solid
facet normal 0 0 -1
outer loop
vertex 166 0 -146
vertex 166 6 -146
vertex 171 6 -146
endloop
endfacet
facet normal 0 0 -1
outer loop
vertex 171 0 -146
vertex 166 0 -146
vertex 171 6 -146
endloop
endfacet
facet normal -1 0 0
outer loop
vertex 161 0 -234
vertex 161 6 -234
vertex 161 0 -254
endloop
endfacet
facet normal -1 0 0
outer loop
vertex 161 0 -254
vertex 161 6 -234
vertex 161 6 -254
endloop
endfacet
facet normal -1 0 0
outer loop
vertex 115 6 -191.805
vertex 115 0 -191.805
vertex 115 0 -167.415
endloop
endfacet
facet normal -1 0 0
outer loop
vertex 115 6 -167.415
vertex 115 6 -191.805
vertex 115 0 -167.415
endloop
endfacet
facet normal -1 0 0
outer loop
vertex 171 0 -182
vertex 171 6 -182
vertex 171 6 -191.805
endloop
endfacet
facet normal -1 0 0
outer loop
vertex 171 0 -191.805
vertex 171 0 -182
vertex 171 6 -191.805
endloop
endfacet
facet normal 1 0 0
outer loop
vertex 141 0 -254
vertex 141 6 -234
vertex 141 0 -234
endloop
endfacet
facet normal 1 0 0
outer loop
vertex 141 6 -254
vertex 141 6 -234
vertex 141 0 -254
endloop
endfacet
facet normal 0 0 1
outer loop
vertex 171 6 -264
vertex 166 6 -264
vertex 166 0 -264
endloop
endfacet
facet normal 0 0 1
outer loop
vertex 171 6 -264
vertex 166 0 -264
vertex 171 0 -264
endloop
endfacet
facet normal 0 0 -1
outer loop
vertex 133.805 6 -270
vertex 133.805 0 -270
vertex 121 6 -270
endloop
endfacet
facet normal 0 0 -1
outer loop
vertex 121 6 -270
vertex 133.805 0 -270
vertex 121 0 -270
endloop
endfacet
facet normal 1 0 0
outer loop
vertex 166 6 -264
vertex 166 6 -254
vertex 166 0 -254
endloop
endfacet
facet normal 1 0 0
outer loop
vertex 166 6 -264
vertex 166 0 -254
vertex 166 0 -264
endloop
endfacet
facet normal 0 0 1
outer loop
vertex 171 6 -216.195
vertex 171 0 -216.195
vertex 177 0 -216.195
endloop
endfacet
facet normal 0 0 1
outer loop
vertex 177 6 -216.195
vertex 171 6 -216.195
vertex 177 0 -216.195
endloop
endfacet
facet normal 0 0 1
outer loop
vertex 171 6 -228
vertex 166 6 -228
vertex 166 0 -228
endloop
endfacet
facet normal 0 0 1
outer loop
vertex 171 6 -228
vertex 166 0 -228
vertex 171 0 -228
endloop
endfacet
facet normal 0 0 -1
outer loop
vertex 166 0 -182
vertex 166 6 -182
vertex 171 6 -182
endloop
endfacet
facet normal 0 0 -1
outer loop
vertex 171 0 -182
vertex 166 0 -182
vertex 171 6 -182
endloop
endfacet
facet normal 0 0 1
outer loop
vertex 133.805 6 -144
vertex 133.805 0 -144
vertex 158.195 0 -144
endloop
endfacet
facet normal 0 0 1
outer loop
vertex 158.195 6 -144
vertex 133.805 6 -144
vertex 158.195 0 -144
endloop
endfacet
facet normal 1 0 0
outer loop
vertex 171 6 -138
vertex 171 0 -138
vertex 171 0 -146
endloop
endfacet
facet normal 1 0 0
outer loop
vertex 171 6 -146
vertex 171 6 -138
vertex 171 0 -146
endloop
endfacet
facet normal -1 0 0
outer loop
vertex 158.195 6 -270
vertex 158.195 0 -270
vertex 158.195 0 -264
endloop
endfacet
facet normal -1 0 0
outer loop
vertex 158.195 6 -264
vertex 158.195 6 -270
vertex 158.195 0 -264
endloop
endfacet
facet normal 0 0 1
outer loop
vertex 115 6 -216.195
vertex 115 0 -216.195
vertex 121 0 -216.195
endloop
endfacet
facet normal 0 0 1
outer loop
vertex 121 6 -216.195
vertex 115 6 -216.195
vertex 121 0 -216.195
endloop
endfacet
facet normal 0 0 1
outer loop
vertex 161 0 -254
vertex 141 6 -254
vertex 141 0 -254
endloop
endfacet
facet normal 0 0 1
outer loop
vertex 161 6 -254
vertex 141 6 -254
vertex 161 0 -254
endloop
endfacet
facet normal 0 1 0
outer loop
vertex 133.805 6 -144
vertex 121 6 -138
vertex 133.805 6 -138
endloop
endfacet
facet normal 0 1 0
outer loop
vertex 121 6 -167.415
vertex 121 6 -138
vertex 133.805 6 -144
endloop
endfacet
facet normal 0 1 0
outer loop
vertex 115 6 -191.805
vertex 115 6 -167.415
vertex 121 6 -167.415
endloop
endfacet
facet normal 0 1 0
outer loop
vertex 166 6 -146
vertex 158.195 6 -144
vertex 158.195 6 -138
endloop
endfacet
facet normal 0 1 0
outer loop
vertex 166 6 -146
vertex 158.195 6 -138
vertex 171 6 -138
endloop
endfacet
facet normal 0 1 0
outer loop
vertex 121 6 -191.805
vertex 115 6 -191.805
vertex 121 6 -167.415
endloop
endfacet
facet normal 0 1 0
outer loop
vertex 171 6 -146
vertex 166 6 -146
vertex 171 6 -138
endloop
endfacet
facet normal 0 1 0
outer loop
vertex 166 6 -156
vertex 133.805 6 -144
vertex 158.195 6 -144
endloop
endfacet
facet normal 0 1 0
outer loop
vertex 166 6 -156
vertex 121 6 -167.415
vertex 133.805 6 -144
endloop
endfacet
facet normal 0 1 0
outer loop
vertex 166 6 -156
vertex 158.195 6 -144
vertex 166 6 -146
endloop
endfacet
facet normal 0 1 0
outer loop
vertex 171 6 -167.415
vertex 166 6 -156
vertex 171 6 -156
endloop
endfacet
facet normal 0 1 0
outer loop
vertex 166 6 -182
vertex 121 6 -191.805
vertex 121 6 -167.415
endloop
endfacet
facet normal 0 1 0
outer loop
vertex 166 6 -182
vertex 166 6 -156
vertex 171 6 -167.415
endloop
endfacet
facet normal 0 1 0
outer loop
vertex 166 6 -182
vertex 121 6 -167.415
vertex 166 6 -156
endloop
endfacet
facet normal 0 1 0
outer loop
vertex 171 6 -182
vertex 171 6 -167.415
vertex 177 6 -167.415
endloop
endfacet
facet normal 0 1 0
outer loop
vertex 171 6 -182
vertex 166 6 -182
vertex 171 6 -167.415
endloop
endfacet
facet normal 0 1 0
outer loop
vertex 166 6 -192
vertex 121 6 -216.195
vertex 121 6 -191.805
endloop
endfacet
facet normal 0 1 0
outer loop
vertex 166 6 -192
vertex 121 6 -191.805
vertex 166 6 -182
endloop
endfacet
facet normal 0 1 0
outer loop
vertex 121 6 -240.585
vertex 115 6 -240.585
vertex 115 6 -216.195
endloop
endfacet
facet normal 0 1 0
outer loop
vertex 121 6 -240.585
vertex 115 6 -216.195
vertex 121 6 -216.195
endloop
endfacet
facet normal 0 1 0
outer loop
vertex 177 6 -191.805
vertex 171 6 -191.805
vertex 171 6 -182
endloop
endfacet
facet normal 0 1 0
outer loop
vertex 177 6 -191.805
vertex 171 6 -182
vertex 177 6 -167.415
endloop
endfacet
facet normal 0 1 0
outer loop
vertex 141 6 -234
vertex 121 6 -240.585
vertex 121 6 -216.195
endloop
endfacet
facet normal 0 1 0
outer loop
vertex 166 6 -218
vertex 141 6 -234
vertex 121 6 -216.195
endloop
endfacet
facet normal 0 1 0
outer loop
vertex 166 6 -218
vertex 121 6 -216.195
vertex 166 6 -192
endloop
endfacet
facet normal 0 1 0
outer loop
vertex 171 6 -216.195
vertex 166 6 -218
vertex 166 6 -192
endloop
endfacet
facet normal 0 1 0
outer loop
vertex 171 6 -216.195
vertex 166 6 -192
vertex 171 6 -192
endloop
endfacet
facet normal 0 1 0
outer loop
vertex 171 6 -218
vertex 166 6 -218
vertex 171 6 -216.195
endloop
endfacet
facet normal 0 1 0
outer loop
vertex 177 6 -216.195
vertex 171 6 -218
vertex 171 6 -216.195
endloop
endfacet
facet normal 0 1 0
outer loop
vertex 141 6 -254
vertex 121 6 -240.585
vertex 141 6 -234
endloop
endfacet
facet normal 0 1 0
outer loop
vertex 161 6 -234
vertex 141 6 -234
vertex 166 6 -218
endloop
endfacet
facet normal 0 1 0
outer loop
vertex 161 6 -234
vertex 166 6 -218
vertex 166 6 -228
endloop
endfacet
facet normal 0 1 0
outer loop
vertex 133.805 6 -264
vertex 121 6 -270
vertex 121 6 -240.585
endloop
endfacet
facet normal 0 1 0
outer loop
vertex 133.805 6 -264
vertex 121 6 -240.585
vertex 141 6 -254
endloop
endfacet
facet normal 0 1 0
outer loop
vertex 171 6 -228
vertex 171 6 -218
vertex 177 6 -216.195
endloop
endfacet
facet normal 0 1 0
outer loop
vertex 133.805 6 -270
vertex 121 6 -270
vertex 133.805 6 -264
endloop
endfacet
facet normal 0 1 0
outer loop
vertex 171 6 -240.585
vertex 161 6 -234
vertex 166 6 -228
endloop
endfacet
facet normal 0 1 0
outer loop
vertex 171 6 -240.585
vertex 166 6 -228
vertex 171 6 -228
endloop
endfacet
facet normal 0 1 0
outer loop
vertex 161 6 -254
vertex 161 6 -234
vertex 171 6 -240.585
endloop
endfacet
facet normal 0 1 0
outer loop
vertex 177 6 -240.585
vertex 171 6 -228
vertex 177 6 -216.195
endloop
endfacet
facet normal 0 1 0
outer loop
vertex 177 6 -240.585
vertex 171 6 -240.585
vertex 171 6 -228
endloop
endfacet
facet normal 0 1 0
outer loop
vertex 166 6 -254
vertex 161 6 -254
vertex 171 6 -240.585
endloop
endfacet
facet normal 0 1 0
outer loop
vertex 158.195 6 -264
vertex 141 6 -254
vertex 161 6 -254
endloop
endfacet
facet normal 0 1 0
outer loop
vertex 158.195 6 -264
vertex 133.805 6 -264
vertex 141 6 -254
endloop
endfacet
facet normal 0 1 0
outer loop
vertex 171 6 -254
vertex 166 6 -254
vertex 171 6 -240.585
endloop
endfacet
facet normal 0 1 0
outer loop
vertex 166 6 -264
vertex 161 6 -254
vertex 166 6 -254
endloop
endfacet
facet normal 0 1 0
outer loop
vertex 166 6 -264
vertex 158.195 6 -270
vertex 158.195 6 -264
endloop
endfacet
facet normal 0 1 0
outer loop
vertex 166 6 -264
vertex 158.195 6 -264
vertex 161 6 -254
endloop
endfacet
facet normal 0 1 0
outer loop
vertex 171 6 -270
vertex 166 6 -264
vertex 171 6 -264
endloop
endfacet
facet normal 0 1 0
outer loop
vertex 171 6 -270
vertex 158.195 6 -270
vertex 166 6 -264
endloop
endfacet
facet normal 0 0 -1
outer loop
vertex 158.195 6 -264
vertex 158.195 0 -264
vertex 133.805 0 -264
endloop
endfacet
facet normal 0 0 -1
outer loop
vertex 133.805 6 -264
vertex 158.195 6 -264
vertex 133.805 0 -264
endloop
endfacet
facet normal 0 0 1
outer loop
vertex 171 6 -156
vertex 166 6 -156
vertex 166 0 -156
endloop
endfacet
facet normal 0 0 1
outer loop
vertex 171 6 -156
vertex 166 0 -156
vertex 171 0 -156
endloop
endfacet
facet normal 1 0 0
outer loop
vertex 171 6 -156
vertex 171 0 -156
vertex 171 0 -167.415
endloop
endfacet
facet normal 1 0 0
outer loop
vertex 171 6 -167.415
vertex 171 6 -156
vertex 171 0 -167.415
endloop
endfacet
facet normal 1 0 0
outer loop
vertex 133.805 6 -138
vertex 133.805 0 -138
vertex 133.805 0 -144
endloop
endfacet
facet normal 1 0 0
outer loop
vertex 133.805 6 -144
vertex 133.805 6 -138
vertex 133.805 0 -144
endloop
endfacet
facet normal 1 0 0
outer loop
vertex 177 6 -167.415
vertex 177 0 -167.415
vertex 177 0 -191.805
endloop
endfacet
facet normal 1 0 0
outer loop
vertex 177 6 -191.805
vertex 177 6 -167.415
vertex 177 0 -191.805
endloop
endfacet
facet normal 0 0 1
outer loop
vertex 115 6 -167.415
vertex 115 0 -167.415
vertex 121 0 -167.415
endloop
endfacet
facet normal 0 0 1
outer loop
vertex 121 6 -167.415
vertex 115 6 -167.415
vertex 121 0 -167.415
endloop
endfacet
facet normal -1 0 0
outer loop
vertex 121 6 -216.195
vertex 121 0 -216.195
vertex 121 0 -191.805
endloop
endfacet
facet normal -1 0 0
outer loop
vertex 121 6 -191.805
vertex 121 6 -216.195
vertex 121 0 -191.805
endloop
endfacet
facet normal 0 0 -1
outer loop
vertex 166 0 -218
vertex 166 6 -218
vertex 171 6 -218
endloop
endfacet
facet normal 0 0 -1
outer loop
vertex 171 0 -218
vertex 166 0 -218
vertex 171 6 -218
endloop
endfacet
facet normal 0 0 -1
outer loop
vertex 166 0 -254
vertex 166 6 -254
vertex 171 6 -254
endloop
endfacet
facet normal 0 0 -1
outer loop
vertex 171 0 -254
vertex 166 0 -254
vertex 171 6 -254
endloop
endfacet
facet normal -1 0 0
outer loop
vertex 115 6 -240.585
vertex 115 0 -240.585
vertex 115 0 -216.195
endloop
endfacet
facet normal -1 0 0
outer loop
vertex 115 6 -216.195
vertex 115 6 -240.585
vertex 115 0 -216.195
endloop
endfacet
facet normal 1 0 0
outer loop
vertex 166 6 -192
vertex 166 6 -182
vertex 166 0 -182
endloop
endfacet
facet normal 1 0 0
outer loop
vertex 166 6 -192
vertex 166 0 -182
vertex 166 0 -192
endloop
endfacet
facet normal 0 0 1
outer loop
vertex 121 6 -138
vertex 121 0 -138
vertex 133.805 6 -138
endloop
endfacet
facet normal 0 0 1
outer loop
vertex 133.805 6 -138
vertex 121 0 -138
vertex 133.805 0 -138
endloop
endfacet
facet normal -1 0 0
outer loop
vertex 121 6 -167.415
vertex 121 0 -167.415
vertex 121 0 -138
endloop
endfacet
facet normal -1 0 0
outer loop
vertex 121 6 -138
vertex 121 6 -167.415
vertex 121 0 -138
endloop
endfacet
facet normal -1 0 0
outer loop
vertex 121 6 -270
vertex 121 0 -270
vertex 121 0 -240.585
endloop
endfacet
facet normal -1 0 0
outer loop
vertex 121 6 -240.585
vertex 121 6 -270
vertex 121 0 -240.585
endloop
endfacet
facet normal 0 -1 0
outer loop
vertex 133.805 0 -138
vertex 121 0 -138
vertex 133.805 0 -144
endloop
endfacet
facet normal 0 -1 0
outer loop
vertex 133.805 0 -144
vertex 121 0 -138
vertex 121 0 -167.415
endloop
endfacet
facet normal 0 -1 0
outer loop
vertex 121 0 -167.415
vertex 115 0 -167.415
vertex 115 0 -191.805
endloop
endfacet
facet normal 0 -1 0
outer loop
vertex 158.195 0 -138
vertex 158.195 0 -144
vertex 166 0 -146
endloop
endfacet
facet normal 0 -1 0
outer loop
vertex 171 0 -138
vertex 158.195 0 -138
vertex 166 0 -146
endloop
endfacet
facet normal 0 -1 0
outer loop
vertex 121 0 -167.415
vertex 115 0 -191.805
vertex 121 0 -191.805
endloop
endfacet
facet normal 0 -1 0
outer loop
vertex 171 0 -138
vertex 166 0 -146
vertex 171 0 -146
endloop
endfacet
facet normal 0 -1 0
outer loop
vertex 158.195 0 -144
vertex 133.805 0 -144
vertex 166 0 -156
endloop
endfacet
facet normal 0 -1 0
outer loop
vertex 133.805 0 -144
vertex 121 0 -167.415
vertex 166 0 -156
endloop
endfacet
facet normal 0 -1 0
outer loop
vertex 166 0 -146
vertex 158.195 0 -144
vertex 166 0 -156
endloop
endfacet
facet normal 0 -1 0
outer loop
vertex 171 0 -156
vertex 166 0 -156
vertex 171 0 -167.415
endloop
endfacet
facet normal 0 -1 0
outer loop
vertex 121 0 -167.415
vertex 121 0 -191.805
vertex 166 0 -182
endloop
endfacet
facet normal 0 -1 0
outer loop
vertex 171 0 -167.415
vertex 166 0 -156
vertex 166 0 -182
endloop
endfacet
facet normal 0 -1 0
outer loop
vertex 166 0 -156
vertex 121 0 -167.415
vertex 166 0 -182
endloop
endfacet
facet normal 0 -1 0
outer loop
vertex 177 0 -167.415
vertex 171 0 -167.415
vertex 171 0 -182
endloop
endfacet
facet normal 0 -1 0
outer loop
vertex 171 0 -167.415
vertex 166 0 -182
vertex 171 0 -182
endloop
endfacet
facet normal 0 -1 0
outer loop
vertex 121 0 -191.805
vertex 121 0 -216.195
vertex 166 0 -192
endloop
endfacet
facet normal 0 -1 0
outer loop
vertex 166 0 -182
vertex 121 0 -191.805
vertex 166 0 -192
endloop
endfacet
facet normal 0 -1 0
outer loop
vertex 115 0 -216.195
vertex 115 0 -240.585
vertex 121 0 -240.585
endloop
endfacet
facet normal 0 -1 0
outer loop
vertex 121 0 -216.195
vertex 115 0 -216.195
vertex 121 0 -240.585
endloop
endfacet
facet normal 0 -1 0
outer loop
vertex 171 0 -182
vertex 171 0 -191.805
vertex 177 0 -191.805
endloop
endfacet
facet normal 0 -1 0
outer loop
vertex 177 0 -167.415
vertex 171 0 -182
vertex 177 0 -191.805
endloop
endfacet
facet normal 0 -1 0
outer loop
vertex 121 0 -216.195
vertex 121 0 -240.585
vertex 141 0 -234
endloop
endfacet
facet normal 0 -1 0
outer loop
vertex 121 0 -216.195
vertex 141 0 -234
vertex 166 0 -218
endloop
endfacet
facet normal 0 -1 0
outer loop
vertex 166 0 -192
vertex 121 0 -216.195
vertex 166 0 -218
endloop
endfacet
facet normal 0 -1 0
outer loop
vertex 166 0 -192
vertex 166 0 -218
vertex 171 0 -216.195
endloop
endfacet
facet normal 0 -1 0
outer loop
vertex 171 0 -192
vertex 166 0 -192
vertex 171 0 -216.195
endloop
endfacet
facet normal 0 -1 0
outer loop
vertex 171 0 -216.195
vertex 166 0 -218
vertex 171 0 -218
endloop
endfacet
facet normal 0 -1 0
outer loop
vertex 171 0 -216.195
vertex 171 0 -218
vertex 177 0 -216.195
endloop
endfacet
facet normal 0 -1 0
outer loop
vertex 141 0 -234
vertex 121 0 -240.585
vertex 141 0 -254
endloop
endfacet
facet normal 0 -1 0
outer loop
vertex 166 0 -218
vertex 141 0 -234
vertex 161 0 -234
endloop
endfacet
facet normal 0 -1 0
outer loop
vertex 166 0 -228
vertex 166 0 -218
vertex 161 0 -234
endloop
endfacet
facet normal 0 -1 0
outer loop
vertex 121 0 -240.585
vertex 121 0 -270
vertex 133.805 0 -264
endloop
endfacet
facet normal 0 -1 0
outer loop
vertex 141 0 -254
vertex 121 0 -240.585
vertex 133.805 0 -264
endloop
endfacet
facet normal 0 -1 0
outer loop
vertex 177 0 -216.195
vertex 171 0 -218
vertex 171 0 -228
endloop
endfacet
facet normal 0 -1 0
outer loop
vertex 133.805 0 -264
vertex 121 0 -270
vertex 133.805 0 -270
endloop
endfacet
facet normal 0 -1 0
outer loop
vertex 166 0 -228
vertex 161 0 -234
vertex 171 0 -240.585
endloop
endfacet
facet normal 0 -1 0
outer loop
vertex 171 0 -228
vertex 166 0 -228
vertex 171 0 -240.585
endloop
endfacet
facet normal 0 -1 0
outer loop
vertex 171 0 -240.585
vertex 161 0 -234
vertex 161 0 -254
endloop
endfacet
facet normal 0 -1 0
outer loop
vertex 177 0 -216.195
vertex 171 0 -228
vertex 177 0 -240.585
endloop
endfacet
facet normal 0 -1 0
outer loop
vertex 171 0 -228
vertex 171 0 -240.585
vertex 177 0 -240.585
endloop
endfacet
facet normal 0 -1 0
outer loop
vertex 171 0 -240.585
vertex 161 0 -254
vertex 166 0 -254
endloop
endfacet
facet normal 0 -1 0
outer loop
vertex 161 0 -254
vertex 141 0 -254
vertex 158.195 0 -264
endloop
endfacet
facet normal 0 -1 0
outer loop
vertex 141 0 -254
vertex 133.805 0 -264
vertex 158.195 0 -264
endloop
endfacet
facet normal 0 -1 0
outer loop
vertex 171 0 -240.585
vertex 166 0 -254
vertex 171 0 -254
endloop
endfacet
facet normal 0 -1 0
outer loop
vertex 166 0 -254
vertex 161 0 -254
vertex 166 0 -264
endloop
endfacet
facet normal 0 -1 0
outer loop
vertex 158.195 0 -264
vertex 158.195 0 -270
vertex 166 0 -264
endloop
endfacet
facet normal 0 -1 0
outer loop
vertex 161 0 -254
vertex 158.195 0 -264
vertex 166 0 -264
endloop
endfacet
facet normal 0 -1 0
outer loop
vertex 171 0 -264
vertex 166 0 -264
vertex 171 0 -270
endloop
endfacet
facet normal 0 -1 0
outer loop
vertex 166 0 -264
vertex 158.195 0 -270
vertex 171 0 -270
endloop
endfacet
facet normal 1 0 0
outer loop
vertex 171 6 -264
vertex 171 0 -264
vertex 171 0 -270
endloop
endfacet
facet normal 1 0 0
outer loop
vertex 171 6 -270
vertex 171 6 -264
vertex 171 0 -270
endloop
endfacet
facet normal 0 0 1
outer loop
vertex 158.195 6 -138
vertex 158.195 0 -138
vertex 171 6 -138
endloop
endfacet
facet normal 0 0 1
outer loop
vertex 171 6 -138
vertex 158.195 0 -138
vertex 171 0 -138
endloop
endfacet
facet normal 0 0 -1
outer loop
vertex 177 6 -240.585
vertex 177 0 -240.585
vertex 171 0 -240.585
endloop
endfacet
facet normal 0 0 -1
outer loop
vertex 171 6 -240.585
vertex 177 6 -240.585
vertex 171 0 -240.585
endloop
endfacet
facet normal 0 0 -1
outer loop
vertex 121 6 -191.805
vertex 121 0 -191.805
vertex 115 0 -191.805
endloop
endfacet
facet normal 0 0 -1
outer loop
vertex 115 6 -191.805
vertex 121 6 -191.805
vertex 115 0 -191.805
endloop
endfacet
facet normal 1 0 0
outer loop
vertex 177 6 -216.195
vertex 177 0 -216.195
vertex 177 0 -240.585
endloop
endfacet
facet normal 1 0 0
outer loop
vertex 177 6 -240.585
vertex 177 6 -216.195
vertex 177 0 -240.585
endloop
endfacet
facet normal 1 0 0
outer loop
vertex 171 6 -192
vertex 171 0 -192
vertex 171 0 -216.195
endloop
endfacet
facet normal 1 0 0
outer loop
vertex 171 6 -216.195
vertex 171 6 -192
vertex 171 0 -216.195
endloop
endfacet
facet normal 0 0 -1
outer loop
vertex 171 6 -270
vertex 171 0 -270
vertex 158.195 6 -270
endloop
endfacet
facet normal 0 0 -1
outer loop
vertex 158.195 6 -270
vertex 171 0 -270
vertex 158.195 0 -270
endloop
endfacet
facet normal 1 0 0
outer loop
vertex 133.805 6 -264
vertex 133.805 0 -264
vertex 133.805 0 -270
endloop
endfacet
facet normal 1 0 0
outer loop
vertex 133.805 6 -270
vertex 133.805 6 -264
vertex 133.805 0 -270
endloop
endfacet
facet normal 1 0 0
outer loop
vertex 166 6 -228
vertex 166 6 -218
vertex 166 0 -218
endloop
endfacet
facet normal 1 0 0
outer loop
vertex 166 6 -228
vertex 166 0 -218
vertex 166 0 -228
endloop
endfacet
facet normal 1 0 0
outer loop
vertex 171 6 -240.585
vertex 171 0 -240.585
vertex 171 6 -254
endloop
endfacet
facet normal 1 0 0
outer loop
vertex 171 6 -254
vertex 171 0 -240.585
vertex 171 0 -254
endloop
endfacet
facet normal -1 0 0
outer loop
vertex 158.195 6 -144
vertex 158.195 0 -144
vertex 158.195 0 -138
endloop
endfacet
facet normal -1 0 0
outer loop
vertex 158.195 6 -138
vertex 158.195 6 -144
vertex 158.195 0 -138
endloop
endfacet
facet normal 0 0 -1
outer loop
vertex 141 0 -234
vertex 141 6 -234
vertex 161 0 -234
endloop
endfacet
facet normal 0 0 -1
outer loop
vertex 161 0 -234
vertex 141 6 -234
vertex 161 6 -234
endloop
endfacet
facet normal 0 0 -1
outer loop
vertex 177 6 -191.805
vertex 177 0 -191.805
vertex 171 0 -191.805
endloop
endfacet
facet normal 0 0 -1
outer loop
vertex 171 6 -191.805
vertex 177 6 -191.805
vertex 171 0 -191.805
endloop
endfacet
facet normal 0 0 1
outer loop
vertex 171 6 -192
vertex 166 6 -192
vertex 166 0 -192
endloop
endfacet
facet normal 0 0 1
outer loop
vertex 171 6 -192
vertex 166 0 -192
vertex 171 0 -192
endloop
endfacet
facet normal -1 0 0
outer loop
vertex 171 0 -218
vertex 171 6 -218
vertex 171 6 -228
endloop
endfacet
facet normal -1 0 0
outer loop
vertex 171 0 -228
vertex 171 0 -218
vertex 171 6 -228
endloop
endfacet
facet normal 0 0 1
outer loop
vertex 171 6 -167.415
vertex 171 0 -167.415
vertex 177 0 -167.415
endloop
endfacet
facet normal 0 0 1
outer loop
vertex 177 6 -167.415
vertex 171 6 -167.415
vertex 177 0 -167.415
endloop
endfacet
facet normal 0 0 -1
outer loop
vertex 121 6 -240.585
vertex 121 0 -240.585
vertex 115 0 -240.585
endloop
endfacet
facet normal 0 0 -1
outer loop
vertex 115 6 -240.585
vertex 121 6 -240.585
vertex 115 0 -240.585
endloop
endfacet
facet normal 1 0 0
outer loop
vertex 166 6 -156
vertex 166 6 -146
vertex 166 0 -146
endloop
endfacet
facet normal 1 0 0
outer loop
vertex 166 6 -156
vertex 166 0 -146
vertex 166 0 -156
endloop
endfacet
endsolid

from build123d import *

# Parameters (mm, degrees)
BOSS_EXTRUDE1_DEPTH = 6
SKETCH3_W           = 20
SKETCH3_H           = 20
SKETCH3_W_2         = 5
SKETCH3_H_2         = 10
CUT_EXTRUDE1_DEPTH  = 6


with BuildPart() as part:
    # Sketch2 → Boss-Extrude1 (new body)
    with BuildSketch(Plane(origin=(0, 0, 0), x_dir=(1, 0, 0), z_dir=(0, 1, 0))):
        Polygon((121, 270), (121, 240.585), (115, 240.585), (115, 216.195), (121, 216.195), (121, 191.805), (115, 191.805), (115, 167.415), (121, 167.415), (121, 143.025), (121, 138), (133.805, 138), (133.805, 144), (158.195, 144), (158.195, 138), (171, 138), (171, 167.415), (177, 167.415), (177, 191.805), (171, 191.805), (171, 216.195), (177, 216.195), (177, 240.585), (171, 240.585), (171, 264.975), (171, 270), (158.195, 270), (158.195, 264), (133.805, 264), (133.805, 270), align=None)
    extrude(amount=BOSS_EXTRUDE1_DEPTH)

    # Sketch3 → Cut-Extrude1 (cut)
    with BuildSketch(Plane(origin=(0, 6, 0), x_dir=(1, 0, 0), z_dir=(0, 1, 0))):
        with Locations((151, 244)):
            Rectangle(SKETCH3_W, SKETCH3_H)
        with Locations((168.5, 223)):
            Rectangle(SKETCH3_W_2, SKETCH3_H_2)
        with Locations((168.5, 259)):
            Rectangle(SKETCH3_W_2, SKETCH3_H_2)
        with Locations((168.5, 187)):
            Rectangle(SKETCH3_W_2, SKETCH3_H_2)
        with Locations((168.5, 151)):
            Rectangle(SKETCH3_W_2, SKETCH3_H_2)
    extrude(amount=-CUT_EXTRUDE1_DEPTH, mode=Mode.SUBTRACT)


solid = part.part
